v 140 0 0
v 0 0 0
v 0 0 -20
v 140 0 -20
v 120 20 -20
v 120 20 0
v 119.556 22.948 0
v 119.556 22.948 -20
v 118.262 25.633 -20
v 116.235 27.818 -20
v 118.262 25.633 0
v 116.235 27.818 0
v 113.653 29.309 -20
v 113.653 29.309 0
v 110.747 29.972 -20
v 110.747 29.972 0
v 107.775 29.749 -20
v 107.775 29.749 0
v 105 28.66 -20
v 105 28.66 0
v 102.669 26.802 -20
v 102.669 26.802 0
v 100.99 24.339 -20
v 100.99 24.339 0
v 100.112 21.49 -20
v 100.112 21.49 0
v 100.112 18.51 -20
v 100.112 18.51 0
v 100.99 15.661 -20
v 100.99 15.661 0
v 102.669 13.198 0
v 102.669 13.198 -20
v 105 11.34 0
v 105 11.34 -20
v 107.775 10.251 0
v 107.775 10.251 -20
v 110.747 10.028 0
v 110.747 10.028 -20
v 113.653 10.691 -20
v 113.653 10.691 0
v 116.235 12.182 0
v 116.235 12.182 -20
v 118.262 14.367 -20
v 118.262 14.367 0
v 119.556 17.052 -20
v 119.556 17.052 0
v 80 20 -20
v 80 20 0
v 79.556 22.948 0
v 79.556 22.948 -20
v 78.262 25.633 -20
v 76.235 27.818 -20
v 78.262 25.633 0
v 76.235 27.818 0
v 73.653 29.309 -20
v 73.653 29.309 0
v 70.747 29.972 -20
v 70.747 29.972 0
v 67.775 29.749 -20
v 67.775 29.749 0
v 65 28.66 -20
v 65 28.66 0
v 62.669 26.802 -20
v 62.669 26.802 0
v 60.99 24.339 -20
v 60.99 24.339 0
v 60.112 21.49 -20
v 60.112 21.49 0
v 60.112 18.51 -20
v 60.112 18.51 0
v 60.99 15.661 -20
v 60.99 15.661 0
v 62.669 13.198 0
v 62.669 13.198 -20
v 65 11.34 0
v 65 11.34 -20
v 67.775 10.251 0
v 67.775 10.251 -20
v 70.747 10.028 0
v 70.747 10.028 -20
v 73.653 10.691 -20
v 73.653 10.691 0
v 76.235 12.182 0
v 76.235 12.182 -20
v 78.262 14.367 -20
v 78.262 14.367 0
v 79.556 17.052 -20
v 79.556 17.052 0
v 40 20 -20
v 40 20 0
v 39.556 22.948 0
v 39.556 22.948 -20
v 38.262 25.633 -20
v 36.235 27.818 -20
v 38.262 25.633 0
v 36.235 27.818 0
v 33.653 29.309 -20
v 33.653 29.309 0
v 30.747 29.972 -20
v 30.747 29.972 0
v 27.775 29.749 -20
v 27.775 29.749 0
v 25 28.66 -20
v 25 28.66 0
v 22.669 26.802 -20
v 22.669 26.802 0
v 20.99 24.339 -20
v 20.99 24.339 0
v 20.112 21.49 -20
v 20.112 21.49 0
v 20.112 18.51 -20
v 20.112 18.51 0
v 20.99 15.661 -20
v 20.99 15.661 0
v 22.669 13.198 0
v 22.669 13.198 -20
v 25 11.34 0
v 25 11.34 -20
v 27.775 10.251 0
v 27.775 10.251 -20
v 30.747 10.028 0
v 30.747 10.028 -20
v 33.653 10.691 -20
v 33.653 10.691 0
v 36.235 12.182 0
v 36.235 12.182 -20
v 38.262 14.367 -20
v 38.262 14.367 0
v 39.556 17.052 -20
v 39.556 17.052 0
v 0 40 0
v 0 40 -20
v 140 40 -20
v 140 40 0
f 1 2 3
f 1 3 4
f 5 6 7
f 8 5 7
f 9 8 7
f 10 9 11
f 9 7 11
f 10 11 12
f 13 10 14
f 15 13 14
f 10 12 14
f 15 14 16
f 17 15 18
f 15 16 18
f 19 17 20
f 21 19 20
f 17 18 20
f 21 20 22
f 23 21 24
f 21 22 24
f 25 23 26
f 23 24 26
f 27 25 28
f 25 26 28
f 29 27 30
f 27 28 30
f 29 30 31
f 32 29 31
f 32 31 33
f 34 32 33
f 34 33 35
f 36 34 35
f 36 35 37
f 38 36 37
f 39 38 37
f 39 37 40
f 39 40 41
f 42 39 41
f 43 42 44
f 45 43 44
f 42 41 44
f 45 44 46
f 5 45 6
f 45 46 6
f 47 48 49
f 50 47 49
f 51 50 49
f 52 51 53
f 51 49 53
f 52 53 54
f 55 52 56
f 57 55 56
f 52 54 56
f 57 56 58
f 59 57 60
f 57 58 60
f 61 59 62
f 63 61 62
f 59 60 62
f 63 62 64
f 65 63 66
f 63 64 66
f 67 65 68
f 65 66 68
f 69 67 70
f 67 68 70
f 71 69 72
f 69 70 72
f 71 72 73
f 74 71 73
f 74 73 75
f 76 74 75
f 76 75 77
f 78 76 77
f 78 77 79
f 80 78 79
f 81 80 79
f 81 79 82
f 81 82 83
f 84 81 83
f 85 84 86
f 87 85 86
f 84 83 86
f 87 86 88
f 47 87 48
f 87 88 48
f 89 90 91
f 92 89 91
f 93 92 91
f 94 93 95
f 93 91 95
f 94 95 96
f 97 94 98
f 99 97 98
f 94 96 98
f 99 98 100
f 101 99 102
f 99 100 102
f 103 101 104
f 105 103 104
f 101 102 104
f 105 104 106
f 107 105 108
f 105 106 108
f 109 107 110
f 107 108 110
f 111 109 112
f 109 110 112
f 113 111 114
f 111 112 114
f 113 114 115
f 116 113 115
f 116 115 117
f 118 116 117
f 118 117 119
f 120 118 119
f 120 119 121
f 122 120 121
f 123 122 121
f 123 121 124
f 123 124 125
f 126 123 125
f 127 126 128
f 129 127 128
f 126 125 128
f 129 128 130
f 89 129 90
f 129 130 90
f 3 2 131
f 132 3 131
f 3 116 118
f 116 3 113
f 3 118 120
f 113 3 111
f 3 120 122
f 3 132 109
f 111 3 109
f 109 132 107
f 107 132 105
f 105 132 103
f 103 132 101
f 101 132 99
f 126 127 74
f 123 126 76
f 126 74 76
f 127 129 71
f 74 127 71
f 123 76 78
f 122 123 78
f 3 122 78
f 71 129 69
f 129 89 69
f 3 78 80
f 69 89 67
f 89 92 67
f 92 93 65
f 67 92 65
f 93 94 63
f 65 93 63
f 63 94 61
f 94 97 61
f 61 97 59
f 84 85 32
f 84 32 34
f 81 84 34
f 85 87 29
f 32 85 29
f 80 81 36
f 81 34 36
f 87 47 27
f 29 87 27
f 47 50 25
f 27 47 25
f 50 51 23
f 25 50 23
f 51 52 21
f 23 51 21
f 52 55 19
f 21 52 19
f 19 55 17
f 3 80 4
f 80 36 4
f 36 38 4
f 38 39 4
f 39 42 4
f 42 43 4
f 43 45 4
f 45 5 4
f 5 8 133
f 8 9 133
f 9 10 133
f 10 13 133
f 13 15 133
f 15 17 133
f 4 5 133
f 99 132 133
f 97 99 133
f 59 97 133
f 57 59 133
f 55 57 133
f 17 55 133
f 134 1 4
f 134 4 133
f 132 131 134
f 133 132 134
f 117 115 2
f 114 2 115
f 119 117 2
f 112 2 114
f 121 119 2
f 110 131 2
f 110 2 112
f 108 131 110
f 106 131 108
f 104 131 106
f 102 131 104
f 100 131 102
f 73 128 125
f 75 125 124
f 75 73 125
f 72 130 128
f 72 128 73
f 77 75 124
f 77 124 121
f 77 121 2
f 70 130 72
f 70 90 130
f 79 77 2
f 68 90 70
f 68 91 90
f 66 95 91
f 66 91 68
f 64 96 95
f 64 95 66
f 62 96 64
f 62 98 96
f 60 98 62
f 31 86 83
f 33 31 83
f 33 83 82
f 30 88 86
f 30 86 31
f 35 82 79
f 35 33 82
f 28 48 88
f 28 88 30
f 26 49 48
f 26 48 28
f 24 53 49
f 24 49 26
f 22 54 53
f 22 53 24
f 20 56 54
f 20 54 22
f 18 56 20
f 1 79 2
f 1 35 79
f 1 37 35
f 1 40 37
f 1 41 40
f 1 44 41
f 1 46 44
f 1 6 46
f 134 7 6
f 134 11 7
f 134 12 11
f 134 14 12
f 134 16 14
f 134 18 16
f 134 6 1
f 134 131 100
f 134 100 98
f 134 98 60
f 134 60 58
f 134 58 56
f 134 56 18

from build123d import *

# Parameters (mm, degrees)
SKETCH1_W           = 140
SKETCH1_H           = 40
SKETCH1_R           = 10
BOSS_EXTRUDE1_DEPTH = 20


with BuildPart() as part:
    # Sketch1 → Boss-Extrude1 (new body)
    with BuildSketch(Plane.XY):
        with Locations((70, 20)):
            Rectangle(SKETCH1_W, SKETCH1_H)
        with Locations((30, 20)):
            Circle(SKETCH1_R, mode=Mode.SUBTRACT)
        with Locations((70, 20)):
            Circle(SKETCH1_R, mode=Mode.SUBTRACT)
        with Locations((110, 20)):
            Circle(SKETCH1_R, mode=Mode.SUBTRACT)
    extrude(amount=-BOSS_EXTRUDE1_DEPTH)


solid = part.part
